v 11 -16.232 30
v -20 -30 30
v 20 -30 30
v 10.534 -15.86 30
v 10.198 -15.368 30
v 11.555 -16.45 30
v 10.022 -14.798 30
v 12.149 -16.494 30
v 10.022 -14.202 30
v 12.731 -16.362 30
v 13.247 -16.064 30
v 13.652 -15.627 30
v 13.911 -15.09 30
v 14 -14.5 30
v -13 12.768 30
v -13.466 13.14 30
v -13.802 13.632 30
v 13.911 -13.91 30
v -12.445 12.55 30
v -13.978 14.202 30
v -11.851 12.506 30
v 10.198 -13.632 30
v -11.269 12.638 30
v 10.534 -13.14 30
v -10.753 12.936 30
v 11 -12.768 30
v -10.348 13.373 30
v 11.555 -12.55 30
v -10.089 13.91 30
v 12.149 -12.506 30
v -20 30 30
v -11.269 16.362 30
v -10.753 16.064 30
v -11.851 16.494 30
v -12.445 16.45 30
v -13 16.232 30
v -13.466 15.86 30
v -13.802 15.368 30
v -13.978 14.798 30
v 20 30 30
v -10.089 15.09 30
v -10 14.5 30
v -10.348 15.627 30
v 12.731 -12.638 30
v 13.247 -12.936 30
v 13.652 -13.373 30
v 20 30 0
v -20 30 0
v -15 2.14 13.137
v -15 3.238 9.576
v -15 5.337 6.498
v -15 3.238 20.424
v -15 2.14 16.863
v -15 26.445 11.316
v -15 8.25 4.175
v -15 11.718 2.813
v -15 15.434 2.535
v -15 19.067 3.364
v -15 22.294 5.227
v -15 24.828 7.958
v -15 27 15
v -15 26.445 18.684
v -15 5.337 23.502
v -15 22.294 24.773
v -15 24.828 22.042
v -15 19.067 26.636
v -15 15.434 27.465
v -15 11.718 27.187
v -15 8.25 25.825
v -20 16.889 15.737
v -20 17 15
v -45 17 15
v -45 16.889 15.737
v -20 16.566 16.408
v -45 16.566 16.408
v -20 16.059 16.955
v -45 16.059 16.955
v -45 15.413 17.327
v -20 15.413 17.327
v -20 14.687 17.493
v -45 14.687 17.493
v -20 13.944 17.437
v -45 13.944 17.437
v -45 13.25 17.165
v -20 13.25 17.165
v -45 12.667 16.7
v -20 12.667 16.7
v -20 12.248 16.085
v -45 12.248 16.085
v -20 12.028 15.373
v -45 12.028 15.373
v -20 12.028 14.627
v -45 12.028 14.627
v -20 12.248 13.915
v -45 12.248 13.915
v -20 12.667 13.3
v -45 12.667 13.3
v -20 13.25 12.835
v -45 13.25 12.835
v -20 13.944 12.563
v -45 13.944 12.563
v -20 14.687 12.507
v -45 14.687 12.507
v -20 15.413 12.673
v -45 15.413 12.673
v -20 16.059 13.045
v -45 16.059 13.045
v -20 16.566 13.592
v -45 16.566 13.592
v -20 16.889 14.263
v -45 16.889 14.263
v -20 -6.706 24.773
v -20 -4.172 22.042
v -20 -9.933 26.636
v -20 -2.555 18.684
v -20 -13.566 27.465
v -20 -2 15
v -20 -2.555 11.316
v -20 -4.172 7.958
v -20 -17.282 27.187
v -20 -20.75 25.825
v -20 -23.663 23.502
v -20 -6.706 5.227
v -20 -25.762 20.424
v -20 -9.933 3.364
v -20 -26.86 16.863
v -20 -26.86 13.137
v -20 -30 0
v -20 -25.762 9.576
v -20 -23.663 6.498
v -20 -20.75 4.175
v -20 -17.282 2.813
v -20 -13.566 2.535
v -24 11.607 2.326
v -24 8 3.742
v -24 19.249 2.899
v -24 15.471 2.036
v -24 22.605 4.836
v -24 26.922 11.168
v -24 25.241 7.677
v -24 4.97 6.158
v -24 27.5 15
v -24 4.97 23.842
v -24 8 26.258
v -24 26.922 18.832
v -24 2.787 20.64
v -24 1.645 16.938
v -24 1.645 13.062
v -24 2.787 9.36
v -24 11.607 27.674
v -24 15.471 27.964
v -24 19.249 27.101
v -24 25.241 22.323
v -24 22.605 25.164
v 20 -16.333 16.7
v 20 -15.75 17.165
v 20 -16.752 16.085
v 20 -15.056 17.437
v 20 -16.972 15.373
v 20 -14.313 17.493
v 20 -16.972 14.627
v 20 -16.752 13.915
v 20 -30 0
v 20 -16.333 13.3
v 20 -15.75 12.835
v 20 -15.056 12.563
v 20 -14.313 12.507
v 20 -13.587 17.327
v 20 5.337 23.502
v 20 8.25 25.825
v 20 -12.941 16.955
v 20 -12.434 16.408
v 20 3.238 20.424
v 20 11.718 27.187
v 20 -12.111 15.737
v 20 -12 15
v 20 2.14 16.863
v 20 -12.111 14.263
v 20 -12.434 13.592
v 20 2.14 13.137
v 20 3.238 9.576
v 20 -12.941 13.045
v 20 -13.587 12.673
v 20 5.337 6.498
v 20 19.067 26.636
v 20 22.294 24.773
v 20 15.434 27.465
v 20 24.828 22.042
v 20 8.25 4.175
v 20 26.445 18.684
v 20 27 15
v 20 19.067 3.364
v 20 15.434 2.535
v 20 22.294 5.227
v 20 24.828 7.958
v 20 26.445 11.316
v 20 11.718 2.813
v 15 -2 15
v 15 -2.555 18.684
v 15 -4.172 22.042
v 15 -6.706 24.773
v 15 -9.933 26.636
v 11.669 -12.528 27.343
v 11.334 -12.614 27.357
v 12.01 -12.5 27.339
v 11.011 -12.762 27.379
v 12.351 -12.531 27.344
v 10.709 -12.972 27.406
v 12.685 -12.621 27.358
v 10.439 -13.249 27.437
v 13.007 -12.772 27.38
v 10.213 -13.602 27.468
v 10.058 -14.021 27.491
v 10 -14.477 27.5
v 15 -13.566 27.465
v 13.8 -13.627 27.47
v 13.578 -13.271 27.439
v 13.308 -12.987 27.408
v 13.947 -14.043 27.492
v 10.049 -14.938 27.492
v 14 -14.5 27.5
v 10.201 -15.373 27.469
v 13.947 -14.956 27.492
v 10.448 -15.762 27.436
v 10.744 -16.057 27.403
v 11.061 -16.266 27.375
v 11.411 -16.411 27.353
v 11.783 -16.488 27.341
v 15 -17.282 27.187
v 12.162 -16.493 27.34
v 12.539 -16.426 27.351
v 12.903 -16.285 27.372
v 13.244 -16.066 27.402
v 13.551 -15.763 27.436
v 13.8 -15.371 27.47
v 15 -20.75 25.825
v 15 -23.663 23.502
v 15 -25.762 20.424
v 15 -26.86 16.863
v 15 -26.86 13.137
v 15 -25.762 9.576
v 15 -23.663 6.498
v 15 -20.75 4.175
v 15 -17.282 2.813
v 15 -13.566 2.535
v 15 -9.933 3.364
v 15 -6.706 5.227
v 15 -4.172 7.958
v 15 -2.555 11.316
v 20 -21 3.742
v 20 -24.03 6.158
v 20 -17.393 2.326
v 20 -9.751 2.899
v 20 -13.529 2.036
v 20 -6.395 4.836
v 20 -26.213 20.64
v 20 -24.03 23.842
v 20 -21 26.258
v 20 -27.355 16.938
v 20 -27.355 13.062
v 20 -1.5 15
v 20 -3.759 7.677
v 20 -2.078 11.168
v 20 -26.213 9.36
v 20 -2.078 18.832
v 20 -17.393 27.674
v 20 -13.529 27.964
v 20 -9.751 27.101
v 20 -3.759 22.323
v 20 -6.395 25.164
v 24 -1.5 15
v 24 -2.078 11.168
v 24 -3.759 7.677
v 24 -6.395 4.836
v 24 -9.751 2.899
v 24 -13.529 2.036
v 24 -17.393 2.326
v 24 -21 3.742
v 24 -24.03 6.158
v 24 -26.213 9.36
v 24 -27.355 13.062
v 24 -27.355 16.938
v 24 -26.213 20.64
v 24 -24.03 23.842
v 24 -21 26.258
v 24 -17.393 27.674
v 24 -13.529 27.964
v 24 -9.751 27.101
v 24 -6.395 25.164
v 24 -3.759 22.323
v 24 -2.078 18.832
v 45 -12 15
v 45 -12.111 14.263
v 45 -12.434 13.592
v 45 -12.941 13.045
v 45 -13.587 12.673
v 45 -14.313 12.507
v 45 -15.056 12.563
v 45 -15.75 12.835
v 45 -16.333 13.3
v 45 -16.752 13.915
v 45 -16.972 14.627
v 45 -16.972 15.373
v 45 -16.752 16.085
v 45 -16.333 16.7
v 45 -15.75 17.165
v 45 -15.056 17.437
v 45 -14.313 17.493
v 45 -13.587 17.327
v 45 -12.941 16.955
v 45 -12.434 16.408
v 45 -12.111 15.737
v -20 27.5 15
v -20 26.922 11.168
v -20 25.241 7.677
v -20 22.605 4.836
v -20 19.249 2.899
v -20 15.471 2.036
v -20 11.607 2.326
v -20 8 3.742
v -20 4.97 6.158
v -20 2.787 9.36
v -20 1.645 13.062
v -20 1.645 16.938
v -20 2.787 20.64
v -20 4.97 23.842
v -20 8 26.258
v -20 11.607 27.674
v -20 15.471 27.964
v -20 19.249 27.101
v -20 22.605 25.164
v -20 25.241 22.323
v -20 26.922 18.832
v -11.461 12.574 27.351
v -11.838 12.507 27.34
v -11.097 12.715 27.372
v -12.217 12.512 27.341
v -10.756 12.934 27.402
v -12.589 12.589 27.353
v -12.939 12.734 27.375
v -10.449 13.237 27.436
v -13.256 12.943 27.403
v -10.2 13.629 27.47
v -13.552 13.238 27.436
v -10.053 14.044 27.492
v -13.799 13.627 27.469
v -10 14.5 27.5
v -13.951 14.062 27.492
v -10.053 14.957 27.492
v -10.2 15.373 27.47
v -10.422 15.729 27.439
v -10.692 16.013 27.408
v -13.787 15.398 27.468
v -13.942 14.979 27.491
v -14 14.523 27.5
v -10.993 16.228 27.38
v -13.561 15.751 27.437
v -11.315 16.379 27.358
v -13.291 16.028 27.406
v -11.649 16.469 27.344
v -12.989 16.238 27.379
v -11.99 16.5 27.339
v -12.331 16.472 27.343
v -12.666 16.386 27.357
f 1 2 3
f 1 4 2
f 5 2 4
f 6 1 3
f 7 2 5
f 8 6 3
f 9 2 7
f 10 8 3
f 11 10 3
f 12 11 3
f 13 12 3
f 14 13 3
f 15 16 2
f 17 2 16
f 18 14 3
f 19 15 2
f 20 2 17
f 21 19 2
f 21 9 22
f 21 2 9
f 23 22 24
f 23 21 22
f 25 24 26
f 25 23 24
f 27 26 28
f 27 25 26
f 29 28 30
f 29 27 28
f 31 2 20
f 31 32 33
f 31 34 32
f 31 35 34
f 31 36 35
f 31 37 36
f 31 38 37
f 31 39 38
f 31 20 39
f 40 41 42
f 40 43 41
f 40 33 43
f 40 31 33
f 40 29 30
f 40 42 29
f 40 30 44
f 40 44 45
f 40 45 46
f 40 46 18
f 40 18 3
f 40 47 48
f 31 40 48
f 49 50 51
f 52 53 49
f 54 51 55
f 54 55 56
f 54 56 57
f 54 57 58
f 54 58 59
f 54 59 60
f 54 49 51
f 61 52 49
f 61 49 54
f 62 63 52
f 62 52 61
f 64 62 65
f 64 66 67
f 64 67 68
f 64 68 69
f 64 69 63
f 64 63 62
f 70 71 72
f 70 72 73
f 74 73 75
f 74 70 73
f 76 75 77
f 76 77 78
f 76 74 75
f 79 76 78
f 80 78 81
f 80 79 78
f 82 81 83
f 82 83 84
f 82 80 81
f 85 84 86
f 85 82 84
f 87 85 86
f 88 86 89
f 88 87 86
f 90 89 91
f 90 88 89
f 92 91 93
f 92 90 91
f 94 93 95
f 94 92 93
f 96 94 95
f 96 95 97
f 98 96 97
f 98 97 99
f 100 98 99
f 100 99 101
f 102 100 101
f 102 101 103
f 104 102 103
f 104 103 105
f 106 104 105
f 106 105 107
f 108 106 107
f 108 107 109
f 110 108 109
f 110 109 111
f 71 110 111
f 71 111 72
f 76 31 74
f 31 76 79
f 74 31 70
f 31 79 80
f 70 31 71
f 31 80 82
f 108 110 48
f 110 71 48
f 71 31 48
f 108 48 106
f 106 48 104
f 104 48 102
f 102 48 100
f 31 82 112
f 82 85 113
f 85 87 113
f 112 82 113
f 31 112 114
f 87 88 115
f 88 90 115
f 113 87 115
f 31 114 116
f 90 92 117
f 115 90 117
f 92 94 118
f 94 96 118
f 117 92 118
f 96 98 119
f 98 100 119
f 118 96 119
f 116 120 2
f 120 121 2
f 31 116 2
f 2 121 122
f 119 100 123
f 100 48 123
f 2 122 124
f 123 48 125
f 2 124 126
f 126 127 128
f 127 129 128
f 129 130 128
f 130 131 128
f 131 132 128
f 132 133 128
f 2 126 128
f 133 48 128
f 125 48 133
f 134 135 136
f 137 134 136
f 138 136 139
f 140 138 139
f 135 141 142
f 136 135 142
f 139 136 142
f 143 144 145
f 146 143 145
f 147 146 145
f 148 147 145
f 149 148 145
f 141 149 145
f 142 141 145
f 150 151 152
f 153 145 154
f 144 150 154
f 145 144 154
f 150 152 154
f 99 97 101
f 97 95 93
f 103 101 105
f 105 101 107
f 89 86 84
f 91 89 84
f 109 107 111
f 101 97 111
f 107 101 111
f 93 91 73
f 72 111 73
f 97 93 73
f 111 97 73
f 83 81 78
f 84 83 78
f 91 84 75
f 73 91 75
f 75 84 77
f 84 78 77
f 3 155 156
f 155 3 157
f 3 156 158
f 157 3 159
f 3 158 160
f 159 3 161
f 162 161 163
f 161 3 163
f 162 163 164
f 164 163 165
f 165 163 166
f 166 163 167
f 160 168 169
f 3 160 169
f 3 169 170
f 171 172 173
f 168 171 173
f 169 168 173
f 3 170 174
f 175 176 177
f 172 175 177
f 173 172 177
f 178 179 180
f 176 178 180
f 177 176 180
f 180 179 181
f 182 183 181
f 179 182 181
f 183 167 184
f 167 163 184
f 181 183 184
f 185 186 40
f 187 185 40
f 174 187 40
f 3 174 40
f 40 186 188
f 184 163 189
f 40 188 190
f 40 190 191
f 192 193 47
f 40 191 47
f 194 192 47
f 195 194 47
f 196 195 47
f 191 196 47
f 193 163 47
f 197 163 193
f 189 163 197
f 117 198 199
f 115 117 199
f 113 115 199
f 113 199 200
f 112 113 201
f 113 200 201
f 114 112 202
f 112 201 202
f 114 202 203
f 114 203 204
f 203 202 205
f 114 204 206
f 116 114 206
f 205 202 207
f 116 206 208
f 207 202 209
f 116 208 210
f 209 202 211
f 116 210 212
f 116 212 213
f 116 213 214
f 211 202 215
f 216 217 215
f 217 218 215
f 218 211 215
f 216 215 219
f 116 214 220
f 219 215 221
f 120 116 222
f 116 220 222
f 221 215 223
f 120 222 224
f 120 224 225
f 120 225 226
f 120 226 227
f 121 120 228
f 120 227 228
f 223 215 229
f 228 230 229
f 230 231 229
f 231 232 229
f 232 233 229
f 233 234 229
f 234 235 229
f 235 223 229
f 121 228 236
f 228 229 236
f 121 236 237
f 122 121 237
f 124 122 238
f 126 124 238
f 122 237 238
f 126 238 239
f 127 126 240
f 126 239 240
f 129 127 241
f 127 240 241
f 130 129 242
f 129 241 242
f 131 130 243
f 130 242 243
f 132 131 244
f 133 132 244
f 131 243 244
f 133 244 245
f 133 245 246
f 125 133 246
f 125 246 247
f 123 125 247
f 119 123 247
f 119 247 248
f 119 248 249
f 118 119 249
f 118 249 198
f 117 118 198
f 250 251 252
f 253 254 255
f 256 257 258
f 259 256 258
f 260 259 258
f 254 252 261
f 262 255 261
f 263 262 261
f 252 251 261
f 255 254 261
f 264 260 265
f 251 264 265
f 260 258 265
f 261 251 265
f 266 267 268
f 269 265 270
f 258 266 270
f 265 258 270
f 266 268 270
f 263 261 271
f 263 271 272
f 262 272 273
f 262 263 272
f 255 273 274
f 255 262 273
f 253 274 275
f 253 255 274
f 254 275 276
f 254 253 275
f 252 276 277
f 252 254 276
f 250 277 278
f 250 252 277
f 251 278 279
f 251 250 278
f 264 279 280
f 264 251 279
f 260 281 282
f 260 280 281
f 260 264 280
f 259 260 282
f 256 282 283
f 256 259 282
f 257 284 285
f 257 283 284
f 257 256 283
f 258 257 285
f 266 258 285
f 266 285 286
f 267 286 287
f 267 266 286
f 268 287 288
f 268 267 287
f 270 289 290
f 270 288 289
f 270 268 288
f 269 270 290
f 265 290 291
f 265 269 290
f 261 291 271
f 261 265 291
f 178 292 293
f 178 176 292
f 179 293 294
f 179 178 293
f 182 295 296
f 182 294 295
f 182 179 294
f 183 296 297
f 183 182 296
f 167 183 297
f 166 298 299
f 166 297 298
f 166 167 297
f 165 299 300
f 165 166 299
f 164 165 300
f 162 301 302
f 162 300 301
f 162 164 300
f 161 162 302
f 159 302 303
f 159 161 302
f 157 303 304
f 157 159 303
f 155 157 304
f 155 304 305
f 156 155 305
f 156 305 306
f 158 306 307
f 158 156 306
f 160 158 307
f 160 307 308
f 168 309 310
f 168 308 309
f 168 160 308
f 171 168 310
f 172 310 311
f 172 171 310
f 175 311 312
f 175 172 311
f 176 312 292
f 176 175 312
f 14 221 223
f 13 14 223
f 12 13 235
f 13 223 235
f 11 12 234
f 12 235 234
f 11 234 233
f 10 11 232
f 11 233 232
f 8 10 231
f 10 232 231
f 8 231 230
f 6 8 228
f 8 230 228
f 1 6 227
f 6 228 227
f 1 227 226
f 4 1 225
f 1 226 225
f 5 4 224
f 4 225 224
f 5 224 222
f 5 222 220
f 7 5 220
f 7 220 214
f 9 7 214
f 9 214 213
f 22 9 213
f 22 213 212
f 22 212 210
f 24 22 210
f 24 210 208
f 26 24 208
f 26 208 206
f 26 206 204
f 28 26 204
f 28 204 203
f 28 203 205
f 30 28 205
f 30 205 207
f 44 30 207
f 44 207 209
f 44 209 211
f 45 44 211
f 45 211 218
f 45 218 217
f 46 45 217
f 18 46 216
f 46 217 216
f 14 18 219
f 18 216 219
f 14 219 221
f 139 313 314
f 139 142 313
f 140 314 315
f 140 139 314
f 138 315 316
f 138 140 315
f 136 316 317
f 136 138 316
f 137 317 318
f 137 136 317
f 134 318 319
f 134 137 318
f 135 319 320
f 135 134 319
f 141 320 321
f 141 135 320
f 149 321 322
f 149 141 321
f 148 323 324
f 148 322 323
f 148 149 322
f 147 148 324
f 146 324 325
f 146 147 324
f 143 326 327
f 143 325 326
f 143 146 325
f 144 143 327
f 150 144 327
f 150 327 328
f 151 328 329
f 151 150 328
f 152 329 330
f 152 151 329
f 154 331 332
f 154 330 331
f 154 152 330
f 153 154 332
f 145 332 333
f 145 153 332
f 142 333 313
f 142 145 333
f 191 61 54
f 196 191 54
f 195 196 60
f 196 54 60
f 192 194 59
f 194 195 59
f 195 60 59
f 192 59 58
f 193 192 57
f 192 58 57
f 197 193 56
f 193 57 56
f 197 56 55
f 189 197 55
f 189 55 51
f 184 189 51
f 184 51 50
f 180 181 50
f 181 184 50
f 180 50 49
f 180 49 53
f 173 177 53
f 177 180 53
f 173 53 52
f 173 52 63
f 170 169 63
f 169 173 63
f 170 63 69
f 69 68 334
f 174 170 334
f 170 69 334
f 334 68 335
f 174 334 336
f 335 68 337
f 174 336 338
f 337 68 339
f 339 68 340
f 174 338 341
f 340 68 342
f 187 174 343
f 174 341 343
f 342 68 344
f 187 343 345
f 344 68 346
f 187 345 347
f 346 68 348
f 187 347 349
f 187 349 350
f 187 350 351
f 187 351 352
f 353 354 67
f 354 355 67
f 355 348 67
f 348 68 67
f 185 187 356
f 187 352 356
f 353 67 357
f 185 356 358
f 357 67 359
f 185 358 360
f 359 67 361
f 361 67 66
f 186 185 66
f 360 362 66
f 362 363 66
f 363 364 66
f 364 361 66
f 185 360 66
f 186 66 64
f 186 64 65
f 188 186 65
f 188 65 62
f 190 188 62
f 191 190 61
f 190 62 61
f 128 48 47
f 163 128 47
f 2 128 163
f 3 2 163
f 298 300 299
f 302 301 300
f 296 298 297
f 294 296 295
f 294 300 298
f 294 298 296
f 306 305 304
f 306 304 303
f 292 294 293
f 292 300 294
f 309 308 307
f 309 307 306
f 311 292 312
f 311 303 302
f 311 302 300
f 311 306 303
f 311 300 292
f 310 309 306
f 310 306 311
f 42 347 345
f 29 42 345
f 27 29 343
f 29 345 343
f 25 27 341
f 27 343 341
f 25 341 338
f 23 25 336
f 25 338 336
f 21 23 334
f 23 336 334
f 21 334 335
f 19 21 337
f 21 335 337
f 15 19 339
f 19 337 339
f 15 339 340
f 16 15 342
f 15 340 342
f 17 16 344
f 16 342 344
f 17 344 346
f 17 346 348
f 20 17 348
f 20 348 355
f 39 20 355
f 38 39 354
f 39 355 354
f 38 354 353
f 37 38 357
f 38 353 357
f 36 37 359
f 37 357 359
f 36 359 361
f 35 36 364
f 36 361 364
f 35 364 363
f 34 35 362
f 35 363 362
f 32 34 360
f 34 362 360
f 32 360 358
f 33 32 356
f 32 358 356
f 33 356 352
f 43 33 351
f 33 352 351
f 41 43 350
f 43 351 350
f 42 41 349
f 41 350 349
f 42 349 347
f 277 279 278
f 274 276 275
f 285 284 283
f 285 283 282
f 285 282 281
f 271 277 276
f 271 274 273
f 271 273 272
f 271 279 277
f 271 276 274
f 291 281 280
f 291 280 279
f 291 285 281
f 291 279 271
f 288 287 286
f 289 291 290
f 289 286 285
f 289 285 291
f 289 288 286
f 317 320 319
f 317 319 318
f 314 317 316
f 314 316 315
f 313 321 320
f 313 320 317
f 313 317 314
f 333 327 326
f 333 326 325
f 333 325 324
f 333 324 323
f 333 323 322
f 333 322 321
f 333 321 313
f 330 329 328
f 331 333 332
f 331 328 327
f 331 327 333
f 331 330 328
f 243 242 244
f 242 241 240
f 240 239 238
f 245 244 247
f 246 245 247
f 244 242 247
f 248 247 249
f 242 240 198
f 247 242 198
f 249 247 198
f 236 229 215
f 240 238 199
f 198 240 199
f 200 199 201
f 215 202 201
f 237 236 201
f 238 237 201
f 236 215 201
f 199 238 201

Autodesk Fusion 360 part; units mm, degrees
sketch "Sketch1" plane through (0, 0, 0) normal (0, 0, 1) x (1, 0, 0)
  line L0 (-20, -30) -> (20, -30)
  line L1 (20, -30) -> (20, 30)
  line L2 (20, 30) -> (-20, 30)
  line L3 (-20, 30) -> (-20, -30)
extrude "Extrude1" add sketch "Sketch1" along normal blind 30 makes body 1
sketch "Sketch3" plane through (0, 0, 0) normal (1, 0, 0) x (0, 1, 0)
  circle A0 centre (14.5, 15) radius 12.5
  circle A1 centre (-14.5, 15) radius 12.5
extrude "Extrude2" cut sketch "Sketch3" along normal blind 20 and the other way blind 15 contours A0 bodies 1
extrude "Extrude3" cut sketch "Sketch3" along normal blind 15 and the other way blind 20 contours A1 bodies 1
sketch "Sketch4" plane through (0, 0, 0) normal (0, 0, 1) x (1, 0, 0)
  line L0 (0, -14.5) -> (12, -14.5)
  circle A0 centre (12, -14.5) radius 2
  line L1 (0, 14.5) -> (-12, 14.5)
  circle A1 centre (-12, 14.5) radius 2
  dimension "d18" = 12
  dimension "d19" = 4
  dimension "d20" = 4
extrude "Extrude4" cut sketch "Sketch4" along normal blind 30 and the other way blind -14 bodies 1
sketch "Sketch5" plane through (0, 0, 0) normal (1, 0, 0) x (0, 1, 0)
  circle A0 centre (14.5, 15) radius 2.5
  dimension "d44" = 5
extrude "Extrude5" add sketch "Sketch5" along normal blind -45 and the other way blind 20 bodies 1
sketch "Sketch6" plane through (0, 0, 0) normal (1, 0, 0) x (0, 1, 0)
  circle A0 centre (-14.5, 15) radius 2.5
  dimension "d38" = 5
extrude "Extrude6" add sketch "Sketch6" along normal blind 45 and the other way blind -20 bodies 1
sketch "Sketch7" plane through (0, 0, 0) normal (1, 0, 0) x (0, 1, 0)
  circle A0 centre (-14.5, 15) radius 13
  dimension "d33" = 26
extrude "Extrude7" add sketch "Sketch7" along normal blind 24 and the other way blind -20 separate body makes body 2
sketch "Sketch8" plane through (0, 0, 0) normal (1, 0, 0) x (0, 1, 0)
  circle A0 centre (14.5, 15) radius 13
  dimension "d39" = 26
extrude "Extrude8" add sketch "Sketch8" along normal blind -20 and the other way blind 24 separate body makes body 3
